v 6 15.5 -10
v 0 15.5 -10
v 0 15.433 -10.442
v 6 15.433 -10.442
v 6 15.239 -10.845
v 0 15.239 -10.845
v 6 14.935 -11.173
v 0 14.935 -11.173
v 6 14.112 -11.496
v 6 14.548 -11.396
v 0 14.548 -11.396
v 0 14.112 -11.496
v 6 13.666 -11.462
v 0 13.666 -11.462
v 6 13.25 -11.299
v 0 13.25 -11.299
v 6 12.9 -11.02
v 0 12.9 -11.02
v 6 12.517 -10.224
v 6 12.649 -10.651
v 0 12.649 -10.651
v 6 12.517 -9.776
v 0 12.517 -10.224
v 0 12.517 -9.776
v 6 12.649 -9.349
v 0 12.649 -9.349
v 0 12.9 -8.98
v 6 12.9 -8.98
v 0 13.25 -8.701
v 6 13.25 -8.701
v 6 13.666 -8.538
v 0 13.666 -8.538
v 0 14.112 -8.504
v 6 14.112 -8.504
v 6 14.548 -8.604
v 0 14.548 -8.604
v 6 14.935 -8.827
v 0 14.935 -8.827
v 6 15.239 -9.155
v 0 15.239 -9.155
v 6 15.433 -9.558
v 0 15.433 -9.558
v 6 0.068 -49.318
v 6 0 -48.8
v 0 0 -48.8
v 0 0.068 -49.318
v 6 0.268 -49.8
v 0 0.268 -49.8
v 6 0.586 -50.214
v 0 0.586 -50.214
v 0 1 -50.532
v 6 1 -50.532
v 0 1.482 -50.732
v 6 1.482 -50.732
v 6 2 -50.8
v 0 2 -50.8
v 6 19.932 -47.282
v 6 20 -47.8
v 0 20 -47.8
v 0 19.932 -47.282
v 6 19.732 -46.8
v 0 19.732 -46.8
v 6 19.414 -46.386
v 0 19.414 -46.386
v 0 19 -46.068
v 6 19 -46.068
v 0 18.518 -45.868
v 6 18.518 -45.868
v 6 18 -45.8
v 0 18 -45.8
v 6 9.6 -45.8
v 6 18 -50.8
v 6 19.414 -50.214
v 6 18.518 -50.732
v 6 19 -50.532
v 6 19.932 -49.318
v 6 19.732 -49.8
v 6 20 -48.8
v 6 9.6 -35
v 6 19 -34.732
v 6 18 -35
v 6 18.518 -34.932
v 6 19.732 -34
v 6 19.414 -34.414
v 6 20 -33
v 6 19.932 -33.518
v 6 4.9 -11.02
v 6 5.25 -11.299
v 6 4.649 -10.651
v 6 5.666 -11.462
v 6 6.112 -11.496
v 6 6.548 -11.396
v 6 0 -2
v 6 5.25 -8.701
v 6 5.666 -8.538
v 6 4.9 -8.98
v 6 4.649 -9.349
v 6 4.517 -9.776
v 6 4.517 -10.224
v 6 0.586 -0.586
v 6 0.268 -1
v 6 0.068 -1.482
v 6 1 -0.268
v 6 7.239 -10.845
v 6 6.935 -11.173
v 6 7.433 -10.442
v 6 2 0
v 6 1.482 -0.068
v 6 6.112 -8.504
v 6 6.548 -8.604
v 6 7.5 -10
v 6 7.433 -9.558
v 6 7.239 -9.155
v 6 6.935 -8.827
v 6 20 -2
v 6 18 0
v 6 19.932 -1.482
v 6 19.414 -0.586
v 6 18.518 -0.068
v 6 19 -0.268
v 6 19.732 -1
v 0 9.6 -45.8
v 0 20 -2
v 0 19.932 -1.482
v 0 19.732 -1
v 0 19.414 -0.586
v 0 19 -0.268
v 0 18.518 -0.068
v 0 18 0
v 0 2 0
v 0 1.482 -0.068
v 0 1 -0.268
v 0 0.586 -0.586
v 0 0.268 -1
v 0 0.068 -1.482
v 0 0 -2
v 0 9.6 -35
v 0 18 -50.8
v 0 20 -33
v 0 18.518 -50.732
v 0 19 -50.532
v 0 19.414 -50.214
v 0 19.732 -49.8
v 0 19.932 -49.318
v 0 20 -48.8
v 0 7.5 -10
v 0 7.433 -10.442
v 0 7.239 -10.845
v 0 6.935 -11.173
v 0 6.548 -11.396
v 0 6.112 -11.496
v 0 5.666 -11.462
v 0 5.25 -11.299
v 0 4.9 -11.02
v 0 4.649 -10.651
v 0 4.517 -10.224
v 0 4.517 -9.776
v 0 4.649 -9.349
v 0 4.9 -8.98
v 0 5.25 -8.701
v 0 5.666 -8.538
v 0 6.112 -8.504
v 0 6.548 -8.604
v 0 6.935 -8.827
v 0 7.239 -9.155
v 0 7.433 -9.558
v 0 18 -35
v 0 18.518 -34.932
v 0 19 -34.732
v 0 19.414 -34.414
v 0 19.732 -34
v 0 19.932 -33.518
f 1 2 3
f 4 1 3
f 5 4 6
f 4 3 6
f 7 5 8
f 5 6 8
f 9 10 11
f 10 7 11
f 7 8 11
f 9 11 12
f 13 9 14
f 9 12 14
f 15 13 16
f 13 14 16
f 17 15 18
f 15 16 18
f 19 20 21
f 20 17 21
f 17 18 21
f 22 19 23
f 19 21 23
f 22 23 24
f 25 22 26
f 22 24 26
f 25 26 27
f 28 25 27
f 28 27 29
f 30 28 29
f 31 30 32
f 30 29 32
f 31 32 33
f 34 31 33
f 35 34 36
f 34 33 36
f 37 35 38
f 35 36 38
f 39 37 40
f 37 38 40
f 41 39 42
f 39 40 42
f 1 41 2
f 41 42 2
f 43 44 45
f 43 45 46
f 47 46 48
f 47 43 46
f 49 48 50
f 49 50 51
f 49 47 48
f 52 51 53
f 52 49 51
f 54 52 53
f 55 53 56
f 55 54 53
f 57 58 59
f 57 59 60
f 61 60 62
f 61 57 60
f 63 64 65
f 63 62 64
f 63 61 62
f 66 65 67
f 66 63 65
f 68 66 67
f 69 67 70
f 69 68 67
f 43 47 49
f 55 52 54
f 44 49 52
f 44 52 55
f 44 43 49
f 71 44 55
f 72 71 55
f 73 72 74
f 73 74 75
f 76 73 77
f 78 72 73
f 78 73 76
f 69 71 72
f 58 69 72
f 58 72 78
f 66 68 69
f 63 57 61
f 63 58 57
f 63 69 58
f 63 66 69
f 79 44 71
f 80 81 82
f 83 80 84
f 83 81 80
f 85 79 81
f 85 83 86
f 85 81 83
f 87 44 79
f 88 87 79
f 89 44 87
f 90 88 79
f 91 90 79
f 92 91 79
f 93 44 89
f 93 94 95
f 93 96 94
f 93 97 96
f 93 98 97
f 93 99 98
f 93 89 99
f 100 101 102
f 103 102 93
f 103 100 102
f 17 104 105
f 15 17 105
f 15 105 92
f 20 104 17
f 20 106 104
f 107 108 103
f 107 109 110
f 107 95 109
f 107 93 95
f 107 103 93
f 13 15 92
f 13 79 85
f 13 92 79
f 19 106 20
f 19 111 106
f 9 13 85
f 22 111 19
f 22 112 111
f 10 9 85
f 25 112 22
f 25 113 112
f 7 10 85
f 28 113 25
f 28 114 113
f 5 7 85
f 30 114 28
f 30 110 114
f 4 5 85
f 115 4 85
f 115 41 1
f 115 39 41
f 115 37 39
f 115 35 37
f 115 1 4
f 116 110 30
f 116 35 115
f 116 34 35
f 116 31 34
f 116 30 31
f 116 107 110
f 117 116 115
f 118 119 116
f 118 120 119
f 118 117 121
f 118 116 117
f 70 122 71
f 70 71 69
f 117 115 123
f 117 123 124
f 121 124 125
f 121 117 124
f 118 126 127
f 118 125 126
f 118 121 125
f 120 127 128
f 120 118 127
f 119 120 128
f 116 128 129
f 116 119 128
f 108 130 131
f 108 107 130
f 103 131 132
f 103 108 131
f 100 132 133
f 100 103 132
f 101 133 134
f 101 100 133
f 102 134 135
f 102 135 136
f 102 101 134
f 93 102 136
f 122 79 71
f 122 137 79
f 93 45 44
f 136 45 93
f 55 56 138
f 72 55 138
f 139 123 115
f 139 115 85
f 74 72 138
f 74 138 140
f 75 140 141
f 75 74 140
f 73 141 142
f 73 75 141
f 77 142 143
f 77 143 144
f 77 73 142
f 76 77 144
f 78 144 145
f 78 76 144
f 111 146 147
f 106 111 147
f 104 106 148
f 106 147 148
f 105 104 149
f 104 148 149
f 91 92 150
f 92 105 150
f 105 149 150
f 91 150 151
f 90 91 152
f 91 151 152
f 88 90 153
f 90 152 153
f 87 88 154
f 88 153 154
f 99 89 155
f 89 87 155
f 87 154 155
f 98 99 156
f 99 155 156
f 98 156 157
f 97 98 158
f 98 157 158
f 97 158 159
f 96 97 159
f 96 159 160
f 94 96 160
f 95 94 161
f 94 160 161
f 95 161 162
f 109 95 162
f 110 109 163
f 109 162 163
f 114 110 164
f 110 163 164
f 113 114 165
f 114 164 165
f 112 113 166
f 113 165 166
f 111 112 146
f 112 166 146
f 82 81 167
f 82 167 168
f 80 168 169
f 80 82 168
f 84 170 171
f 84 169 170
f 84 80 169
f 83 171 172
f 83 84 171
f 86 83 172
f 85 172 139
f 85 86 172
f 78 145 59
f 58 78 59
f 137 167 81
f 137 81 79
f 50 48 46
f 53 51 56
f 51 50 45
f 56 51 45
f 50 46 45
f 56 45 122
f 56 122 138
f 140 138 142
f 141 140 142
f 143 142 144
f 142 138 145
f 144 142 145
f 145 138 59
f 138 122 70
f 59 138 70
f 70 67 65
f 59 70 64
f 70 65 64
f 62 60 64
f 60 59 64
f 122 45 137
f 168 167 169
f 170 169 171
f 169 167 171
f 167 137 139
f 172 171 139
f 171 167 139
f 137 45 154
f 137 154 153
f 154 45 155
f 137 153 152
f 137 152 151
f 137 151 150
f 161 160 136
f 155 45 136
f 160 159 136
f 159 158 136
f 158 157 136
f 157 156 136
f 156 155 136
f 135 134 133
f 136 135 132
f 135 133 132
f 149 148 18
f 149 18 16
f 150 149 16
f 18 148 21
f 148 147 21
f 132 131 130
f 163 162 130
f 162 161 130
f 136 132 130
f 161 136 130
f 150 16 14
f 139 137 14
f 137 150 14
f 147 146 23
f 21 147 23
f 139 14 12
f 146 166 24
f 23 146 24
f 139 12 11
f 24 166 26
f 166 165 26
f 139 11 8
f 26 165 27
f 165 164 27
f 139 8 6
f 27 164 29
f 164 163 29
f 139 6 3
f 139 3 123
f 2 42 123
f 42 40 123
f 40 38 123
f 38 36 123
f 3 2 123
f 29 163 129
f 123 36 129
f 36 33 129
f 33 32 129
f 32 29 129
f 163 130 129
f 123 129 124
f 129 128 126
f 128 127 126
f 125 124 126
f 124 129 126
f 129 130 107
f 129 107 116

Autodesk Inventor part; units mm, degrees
ref_plane "YZ Plane" through (0, 0, 0) normal (1, 0, 0) x (0, 1, 0)
ref_plane "XZ Plane" through (0, 0, 0) normal (0, 1, 0) x (-1, 0, 0)
ref_plane "XY Plane" through (0, 0, 0) normal (0, 0, 1) x (1, 0, 0)
sketch "スケッチ1" plane through (0, 0, 0) normal (1, 0, 0) x (0, 1, 0)
  line L0 (0, 0) -> (20, 0)
  line L1 (20, 0) -> (20, -20)
  line L2 (20, -20) -> (0, -20)
  line L3 (0, -20) -> (0, 0)
  line L4 (102.9471, -35) -> (9.6, -35)
  line L5 (9.6, -35) -> (9.6, -45.8)
  line L6 (9.6, -45.8) -> (102.9471, -45.8)
  line L7 (102.9471, -45.8) -> (102.9471, -35)
  circle A0 centre (14, -10) radius 1.5
  circle A1 centre (6, -10) radius 1.5
  line L8 (20, -45.8) -> (0, -45.8)
  line L9 (0, -45.8) -> (0, -50.8)
  line L10 (0, -50.8) -> (20, -50.8)
  line L11 (20, -50.8) -> (20, -45.8)
  line L12 (0, -20) -> (0, -45.8)
  line L13 (20, -20) -> (20, -35)
  dimension "d0" = 20
  dimension "d1" = 20
  dimension "d2" = 10.8
  dimension "d3" = 9.6
  dimension "d4" = 15
  dimension "d5" = 3
  dimension "d6" = 3
  dimension "d7" = 10
  dimension "d8" = 10
  dimension "d9" = 6
  dimension "d10" = 8
  dimension "d11" = 5
  dimension "d12" = 20
  dimension "d13" = 0
extrude "押し出し1" add sketch "スケッチ1" along normal blind 6 contours L0 L1 L2 L3 | L2 L13 L4 L5 L8 L12 | L8 L6 L11 L10 L9
fillet "フィレット1" radius 2 6 edges at (3, 0, 0) (3, 20, 0) (3, 20, -35) (3, 20, -45.8) (3, 20, -50.8) (3, 0, -50.8)
sketch "スケッチ2" plane through (6, 0, 0) normal (1, 0, 0) x (0, 0, -1)
  arc A0 (48.8, 0) -> (50.8, 2) centre (48.8, 2) ccw projected
  line L0 (50.8, 2) -> (50.8, 18) projected
  arc A1 (50.8, 18) -> (48.8, 20) centre (48.8, 18) ccw projected
  line L1 (48.8, 20) -> (47.8, 20) projected
  arc A2 (47.8, 20) -> (45.8, 18) centre (47.8, 18) ccw projected
  line L2 (45.8, 18) -> (45.8, 9.6) projected
  line L3 (45.8, 9.6) -> (35, 9.6) projected
  line L4 (35, 9.6) -> (35, 18) projected
  arc A3 (35, 18) -> (33, 20) centre (33, 18) ccw projected
  line L5 (33, 20) -> (2, 20) projected
  arc A4 (2, 20) -> (0, 18) centre (2, 18) ccw projected
  line L6 (0, 18) -> (0, 2) projected
  arc A5 (0, 2) -> (2, 0) centre (2, 2) ccw projected
  line L7 (2, 0) -> (48.8, 0) projected
  circle A6 centre (10, 6) radius 1.5 projected
  circle A7 centre (10, 14) radius 1.5 projected
  point P0 (0, 0)
equation "\"d12\" = d1"
properties part number "base_weel-v2-POM-pc-F-1" material "ABS プラスチック"
